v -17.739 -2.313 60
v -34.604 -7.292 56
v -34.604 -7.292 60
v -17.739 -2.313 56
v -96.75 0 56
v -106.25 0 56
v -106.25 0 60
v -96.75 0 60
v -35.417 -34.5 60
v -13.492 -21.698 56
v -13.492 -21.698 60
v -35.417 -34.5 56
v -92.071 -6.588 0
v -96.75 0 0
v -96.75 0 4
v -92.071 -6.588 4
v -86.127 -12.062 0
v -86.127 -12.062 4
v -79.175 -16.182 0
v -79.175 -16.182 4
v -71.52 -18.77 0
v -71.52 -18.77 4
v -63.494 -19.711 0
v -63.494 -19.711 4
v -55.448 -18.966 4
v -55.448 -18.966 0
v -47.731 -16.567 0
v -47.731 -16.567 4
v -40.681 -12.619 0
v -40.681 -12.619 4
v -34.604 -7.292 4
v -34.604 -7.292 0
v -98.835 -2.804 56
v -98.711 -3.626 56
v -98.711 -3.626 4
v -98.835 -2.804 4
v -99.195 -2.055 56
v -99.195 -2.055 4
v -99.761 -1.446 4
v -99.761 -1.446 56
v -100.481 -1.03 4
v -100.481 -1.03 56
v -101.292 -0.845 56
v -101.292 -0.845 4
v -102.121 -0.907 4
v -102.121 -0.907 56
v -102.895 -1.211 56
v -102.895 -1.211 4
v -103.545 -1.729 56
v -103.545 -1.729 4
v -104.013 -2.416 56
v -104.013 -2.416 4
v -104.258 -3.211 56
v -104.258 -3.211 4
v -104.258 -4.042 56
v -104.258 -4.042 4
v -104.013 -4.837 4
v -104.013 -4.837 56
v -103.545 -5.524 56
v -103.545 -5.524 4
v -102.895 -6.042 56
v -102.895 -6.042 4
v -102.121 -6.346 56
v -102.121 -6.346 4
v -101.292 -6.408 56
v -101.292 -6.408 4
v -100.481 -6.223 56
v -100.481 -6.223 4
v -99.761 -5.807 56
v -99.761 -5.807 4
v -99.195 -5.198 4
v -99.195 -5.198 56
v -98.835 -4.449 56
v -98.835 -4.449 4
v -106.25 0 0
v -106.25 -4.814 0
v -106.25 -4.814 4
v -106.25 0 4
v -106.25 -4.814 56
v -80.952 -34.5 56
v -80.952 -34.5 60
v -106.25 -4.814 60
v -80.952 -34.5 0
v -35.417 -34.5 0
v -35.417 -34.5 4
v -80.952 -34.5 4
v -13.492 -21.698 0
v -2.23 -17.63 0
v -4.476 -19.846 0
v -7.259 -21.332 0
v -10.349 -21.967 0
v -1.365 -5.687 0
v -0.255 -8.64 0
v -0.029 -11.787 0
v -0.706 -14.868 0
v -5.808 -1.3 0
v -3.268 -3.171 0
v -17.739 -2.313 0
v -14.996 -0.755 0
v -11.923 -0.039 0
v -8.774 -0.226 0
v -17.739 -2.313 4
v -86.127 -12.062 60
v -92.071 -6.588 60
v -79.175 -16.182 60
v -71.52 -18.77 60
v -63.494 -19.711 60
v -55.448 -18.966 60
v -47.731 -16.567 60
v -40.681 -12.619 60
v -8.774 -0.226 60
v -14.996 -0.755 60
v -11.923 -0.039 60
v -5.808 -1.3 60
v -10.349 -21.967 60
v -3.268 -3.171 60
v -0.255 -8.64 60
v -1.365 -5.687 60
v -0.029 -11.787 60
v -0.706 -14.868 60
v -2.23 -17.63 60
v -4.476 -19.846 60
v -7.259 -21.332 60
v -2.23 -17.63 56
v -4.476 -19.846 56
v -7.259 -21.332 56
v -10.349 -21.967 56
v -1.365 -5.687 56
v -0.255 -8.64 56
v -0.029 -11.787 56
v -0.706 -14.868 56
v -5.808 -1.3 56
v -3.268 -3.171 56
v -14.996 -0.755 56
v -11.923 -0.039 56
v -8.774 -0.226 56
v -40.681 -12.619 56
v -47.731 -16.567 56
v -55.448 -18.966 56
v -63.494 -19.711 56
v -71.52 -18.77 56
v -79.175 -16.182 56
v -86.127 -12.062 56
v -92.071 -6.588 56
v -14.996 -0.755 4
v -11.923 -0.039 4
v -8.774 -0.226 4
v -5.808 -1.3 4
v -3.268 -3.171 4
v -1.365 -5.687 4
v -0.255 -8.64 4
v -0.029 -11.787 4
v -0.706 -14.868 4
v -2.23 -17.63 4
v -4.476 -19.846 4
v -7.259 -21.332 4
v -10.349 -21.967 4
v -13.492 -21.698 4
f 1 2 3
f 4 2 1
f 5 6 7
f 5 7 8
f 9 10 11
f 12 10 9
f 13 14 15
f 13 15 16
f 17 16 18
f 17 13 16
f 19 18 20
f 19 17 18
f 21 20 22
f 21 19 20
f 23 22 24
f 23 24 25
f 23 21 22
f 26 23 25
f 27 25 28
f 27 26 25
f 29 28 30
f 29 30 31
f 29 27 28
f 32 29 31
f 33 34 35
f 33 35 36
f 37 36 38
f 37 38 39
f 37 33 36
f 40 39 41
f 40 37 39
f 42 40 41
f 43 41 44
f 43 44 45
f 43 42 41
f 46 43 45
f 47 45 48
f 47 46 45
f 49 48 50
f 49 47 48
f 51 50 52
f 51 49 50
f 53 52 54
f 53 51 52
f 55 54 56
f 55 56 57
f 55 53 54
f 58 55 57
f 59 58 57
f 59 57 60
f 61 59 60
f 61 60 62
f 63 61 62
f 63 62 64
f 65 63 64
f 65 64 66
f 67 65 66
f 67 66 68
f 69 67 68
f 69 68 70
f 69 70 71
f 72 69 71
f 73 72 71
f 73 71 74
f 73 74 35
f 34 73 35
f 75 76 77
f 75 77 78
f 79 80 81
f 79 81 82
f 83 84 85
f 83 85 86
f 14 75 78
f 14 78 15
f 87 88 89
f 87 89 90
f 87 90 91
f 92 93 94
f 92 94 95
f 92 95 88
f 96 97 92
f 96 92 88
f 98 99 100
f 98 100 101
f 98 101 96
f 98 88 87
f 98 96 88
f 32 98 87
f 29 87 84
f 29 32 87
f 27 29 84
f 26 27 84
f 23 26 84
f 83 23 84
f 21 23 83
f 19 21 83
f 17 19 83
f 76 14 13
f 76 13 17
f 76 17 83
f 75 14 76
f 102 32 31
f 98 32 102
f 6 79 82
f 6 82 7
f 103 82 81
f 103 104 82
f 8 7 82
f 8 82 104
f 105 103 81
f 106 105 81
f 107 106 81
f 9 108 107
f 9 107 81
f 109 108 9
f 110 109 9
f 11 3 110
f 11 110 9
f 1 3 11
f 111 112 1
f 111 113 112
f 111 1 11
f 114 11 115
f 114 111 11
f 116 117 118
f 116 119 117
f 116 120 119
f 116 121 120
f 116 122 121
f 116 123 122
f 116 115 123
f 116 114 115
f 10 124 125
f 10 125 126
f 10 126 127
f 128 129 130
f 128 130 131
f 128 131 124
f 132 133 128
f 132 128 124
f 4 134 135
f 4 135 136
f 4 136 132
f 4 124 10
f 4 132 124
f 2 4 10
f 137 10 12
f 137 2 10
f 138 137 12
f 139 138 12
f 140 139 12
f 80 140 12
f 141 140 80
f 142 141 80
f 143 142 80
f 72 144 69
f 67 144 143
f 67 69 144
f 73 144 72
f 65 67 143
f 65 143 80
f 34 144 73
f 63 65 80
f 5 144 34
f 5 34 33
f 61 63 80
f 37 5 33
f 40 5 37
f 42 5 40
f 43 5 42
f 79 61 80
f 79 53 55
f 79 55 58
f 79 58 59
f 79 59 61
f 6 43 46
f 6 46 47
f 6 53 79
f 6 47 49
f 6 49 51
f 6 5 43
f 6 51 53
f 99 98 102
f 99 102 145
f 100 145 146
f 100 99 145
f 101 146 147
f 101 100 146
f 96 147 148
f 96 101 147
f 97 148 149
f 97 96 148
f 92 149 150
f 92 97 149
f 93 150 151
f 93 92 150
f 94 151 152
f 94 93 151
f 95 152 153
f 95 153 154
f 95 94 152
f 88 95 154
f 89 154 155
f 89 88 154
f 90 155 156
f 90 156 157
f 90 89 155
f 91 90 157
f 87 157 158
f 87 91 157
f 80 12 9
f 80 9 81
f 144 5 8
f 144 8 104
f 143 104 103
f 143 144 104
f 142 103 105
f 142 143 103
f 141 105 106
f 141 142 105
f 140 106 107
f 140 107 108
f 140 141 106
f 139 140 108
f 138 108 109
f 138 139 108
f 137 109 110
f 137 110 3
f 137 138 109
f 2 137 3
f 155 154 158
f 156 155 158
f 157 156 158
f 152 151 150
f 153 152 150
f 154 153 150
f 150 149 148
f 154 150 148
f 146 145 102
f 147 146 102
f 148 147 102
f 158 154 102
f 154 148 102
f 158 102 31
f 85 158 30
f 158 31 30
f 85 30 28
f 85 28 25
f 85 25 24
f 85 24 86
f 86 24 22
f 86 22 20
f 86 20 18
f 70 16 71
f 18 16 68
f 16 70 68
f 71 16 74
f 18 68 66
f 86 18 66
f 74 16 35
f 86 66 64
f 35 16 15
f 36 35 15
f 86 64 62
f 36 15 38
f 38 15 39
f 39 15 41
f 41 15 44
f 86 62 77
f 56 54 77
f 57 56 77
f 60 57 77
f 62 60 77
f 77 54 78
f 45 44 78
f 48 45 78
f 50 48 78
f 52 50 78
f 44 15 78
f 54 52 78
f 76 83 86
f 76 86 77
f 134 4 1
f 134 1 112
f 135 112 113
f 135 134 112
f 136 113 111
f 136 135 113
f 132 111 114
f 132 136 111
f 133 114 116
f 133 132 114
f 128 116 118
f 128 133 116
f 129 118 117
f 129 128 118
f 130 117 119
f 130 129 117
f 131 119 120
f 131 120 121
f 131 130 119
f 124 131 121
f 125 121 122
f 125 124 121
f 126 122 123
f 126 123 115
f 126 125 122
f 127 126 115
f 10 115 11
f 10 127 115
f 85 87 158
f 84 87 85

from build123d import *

# Parameters (mm, degrees)
BOSS_EXTRUDE1_DEPTH = 4
LPATTERN1_COUNT     = 2
LPATTERN1_PITCH     = 56
SKETCH2_R           = 2.789357995
BOSS_EXTRUDE2_DEPTH = 56


with BuildPart() as part:
    # Sketch1 → Boss-Extrude1 (new body)
    with BuildSketch(Plane.XY):
        with BuildLine():
            Line((-106.25, 0), (-96.75, 0))
            ThreePointArc((-96.75, 0), (-67.531499401, -19.450486235), (-34.603968254, -7.292366126))
            Line((-34.603968254, -7.292366126), (-17.738888889, -2.31334311))
            ThreePointArc((-17.738888889, -2.31334311), (-0.254682932, -8.640300495), (-13.492063492, -21.697850174))
            Line((-13.492063492, -21.697850174), (-35.416666667, -34.5))
            Line((-35.416666667, -34.5), (-80.952380952, -34.5))
            Line((-80.952380952, -34.5), (-106.25, -4.813953488))
            Line((-106.25, -4.813953488), (-106.25, 0))
        make_face()
    extrude(amount=BOSS_EXTRUDE1_DEPTH)


with BuildPart() as lpattern1_1:
    # LPattern1: pattern copy
    add(part.part.moved(Location(Vector(0, 0, 1) * (1 * LPATTERN1_PITCH))))


with BuildPart() as part_1:
    add(part.part)

    add(lpattern1_1.part)  # Boss-Extrude2 merges LPattern1_1
    # Sketch2 → Boss-Extrude2 (add)
    with BuildSketch(Plane.XY.offset(60)):
        with Locations((-101.5, -3.626457861)):
            Circle(SKETCH2_R)
    extrude(amount=-BOSS_EXTRUDE2_DEPTH)


solid = part_1.part
